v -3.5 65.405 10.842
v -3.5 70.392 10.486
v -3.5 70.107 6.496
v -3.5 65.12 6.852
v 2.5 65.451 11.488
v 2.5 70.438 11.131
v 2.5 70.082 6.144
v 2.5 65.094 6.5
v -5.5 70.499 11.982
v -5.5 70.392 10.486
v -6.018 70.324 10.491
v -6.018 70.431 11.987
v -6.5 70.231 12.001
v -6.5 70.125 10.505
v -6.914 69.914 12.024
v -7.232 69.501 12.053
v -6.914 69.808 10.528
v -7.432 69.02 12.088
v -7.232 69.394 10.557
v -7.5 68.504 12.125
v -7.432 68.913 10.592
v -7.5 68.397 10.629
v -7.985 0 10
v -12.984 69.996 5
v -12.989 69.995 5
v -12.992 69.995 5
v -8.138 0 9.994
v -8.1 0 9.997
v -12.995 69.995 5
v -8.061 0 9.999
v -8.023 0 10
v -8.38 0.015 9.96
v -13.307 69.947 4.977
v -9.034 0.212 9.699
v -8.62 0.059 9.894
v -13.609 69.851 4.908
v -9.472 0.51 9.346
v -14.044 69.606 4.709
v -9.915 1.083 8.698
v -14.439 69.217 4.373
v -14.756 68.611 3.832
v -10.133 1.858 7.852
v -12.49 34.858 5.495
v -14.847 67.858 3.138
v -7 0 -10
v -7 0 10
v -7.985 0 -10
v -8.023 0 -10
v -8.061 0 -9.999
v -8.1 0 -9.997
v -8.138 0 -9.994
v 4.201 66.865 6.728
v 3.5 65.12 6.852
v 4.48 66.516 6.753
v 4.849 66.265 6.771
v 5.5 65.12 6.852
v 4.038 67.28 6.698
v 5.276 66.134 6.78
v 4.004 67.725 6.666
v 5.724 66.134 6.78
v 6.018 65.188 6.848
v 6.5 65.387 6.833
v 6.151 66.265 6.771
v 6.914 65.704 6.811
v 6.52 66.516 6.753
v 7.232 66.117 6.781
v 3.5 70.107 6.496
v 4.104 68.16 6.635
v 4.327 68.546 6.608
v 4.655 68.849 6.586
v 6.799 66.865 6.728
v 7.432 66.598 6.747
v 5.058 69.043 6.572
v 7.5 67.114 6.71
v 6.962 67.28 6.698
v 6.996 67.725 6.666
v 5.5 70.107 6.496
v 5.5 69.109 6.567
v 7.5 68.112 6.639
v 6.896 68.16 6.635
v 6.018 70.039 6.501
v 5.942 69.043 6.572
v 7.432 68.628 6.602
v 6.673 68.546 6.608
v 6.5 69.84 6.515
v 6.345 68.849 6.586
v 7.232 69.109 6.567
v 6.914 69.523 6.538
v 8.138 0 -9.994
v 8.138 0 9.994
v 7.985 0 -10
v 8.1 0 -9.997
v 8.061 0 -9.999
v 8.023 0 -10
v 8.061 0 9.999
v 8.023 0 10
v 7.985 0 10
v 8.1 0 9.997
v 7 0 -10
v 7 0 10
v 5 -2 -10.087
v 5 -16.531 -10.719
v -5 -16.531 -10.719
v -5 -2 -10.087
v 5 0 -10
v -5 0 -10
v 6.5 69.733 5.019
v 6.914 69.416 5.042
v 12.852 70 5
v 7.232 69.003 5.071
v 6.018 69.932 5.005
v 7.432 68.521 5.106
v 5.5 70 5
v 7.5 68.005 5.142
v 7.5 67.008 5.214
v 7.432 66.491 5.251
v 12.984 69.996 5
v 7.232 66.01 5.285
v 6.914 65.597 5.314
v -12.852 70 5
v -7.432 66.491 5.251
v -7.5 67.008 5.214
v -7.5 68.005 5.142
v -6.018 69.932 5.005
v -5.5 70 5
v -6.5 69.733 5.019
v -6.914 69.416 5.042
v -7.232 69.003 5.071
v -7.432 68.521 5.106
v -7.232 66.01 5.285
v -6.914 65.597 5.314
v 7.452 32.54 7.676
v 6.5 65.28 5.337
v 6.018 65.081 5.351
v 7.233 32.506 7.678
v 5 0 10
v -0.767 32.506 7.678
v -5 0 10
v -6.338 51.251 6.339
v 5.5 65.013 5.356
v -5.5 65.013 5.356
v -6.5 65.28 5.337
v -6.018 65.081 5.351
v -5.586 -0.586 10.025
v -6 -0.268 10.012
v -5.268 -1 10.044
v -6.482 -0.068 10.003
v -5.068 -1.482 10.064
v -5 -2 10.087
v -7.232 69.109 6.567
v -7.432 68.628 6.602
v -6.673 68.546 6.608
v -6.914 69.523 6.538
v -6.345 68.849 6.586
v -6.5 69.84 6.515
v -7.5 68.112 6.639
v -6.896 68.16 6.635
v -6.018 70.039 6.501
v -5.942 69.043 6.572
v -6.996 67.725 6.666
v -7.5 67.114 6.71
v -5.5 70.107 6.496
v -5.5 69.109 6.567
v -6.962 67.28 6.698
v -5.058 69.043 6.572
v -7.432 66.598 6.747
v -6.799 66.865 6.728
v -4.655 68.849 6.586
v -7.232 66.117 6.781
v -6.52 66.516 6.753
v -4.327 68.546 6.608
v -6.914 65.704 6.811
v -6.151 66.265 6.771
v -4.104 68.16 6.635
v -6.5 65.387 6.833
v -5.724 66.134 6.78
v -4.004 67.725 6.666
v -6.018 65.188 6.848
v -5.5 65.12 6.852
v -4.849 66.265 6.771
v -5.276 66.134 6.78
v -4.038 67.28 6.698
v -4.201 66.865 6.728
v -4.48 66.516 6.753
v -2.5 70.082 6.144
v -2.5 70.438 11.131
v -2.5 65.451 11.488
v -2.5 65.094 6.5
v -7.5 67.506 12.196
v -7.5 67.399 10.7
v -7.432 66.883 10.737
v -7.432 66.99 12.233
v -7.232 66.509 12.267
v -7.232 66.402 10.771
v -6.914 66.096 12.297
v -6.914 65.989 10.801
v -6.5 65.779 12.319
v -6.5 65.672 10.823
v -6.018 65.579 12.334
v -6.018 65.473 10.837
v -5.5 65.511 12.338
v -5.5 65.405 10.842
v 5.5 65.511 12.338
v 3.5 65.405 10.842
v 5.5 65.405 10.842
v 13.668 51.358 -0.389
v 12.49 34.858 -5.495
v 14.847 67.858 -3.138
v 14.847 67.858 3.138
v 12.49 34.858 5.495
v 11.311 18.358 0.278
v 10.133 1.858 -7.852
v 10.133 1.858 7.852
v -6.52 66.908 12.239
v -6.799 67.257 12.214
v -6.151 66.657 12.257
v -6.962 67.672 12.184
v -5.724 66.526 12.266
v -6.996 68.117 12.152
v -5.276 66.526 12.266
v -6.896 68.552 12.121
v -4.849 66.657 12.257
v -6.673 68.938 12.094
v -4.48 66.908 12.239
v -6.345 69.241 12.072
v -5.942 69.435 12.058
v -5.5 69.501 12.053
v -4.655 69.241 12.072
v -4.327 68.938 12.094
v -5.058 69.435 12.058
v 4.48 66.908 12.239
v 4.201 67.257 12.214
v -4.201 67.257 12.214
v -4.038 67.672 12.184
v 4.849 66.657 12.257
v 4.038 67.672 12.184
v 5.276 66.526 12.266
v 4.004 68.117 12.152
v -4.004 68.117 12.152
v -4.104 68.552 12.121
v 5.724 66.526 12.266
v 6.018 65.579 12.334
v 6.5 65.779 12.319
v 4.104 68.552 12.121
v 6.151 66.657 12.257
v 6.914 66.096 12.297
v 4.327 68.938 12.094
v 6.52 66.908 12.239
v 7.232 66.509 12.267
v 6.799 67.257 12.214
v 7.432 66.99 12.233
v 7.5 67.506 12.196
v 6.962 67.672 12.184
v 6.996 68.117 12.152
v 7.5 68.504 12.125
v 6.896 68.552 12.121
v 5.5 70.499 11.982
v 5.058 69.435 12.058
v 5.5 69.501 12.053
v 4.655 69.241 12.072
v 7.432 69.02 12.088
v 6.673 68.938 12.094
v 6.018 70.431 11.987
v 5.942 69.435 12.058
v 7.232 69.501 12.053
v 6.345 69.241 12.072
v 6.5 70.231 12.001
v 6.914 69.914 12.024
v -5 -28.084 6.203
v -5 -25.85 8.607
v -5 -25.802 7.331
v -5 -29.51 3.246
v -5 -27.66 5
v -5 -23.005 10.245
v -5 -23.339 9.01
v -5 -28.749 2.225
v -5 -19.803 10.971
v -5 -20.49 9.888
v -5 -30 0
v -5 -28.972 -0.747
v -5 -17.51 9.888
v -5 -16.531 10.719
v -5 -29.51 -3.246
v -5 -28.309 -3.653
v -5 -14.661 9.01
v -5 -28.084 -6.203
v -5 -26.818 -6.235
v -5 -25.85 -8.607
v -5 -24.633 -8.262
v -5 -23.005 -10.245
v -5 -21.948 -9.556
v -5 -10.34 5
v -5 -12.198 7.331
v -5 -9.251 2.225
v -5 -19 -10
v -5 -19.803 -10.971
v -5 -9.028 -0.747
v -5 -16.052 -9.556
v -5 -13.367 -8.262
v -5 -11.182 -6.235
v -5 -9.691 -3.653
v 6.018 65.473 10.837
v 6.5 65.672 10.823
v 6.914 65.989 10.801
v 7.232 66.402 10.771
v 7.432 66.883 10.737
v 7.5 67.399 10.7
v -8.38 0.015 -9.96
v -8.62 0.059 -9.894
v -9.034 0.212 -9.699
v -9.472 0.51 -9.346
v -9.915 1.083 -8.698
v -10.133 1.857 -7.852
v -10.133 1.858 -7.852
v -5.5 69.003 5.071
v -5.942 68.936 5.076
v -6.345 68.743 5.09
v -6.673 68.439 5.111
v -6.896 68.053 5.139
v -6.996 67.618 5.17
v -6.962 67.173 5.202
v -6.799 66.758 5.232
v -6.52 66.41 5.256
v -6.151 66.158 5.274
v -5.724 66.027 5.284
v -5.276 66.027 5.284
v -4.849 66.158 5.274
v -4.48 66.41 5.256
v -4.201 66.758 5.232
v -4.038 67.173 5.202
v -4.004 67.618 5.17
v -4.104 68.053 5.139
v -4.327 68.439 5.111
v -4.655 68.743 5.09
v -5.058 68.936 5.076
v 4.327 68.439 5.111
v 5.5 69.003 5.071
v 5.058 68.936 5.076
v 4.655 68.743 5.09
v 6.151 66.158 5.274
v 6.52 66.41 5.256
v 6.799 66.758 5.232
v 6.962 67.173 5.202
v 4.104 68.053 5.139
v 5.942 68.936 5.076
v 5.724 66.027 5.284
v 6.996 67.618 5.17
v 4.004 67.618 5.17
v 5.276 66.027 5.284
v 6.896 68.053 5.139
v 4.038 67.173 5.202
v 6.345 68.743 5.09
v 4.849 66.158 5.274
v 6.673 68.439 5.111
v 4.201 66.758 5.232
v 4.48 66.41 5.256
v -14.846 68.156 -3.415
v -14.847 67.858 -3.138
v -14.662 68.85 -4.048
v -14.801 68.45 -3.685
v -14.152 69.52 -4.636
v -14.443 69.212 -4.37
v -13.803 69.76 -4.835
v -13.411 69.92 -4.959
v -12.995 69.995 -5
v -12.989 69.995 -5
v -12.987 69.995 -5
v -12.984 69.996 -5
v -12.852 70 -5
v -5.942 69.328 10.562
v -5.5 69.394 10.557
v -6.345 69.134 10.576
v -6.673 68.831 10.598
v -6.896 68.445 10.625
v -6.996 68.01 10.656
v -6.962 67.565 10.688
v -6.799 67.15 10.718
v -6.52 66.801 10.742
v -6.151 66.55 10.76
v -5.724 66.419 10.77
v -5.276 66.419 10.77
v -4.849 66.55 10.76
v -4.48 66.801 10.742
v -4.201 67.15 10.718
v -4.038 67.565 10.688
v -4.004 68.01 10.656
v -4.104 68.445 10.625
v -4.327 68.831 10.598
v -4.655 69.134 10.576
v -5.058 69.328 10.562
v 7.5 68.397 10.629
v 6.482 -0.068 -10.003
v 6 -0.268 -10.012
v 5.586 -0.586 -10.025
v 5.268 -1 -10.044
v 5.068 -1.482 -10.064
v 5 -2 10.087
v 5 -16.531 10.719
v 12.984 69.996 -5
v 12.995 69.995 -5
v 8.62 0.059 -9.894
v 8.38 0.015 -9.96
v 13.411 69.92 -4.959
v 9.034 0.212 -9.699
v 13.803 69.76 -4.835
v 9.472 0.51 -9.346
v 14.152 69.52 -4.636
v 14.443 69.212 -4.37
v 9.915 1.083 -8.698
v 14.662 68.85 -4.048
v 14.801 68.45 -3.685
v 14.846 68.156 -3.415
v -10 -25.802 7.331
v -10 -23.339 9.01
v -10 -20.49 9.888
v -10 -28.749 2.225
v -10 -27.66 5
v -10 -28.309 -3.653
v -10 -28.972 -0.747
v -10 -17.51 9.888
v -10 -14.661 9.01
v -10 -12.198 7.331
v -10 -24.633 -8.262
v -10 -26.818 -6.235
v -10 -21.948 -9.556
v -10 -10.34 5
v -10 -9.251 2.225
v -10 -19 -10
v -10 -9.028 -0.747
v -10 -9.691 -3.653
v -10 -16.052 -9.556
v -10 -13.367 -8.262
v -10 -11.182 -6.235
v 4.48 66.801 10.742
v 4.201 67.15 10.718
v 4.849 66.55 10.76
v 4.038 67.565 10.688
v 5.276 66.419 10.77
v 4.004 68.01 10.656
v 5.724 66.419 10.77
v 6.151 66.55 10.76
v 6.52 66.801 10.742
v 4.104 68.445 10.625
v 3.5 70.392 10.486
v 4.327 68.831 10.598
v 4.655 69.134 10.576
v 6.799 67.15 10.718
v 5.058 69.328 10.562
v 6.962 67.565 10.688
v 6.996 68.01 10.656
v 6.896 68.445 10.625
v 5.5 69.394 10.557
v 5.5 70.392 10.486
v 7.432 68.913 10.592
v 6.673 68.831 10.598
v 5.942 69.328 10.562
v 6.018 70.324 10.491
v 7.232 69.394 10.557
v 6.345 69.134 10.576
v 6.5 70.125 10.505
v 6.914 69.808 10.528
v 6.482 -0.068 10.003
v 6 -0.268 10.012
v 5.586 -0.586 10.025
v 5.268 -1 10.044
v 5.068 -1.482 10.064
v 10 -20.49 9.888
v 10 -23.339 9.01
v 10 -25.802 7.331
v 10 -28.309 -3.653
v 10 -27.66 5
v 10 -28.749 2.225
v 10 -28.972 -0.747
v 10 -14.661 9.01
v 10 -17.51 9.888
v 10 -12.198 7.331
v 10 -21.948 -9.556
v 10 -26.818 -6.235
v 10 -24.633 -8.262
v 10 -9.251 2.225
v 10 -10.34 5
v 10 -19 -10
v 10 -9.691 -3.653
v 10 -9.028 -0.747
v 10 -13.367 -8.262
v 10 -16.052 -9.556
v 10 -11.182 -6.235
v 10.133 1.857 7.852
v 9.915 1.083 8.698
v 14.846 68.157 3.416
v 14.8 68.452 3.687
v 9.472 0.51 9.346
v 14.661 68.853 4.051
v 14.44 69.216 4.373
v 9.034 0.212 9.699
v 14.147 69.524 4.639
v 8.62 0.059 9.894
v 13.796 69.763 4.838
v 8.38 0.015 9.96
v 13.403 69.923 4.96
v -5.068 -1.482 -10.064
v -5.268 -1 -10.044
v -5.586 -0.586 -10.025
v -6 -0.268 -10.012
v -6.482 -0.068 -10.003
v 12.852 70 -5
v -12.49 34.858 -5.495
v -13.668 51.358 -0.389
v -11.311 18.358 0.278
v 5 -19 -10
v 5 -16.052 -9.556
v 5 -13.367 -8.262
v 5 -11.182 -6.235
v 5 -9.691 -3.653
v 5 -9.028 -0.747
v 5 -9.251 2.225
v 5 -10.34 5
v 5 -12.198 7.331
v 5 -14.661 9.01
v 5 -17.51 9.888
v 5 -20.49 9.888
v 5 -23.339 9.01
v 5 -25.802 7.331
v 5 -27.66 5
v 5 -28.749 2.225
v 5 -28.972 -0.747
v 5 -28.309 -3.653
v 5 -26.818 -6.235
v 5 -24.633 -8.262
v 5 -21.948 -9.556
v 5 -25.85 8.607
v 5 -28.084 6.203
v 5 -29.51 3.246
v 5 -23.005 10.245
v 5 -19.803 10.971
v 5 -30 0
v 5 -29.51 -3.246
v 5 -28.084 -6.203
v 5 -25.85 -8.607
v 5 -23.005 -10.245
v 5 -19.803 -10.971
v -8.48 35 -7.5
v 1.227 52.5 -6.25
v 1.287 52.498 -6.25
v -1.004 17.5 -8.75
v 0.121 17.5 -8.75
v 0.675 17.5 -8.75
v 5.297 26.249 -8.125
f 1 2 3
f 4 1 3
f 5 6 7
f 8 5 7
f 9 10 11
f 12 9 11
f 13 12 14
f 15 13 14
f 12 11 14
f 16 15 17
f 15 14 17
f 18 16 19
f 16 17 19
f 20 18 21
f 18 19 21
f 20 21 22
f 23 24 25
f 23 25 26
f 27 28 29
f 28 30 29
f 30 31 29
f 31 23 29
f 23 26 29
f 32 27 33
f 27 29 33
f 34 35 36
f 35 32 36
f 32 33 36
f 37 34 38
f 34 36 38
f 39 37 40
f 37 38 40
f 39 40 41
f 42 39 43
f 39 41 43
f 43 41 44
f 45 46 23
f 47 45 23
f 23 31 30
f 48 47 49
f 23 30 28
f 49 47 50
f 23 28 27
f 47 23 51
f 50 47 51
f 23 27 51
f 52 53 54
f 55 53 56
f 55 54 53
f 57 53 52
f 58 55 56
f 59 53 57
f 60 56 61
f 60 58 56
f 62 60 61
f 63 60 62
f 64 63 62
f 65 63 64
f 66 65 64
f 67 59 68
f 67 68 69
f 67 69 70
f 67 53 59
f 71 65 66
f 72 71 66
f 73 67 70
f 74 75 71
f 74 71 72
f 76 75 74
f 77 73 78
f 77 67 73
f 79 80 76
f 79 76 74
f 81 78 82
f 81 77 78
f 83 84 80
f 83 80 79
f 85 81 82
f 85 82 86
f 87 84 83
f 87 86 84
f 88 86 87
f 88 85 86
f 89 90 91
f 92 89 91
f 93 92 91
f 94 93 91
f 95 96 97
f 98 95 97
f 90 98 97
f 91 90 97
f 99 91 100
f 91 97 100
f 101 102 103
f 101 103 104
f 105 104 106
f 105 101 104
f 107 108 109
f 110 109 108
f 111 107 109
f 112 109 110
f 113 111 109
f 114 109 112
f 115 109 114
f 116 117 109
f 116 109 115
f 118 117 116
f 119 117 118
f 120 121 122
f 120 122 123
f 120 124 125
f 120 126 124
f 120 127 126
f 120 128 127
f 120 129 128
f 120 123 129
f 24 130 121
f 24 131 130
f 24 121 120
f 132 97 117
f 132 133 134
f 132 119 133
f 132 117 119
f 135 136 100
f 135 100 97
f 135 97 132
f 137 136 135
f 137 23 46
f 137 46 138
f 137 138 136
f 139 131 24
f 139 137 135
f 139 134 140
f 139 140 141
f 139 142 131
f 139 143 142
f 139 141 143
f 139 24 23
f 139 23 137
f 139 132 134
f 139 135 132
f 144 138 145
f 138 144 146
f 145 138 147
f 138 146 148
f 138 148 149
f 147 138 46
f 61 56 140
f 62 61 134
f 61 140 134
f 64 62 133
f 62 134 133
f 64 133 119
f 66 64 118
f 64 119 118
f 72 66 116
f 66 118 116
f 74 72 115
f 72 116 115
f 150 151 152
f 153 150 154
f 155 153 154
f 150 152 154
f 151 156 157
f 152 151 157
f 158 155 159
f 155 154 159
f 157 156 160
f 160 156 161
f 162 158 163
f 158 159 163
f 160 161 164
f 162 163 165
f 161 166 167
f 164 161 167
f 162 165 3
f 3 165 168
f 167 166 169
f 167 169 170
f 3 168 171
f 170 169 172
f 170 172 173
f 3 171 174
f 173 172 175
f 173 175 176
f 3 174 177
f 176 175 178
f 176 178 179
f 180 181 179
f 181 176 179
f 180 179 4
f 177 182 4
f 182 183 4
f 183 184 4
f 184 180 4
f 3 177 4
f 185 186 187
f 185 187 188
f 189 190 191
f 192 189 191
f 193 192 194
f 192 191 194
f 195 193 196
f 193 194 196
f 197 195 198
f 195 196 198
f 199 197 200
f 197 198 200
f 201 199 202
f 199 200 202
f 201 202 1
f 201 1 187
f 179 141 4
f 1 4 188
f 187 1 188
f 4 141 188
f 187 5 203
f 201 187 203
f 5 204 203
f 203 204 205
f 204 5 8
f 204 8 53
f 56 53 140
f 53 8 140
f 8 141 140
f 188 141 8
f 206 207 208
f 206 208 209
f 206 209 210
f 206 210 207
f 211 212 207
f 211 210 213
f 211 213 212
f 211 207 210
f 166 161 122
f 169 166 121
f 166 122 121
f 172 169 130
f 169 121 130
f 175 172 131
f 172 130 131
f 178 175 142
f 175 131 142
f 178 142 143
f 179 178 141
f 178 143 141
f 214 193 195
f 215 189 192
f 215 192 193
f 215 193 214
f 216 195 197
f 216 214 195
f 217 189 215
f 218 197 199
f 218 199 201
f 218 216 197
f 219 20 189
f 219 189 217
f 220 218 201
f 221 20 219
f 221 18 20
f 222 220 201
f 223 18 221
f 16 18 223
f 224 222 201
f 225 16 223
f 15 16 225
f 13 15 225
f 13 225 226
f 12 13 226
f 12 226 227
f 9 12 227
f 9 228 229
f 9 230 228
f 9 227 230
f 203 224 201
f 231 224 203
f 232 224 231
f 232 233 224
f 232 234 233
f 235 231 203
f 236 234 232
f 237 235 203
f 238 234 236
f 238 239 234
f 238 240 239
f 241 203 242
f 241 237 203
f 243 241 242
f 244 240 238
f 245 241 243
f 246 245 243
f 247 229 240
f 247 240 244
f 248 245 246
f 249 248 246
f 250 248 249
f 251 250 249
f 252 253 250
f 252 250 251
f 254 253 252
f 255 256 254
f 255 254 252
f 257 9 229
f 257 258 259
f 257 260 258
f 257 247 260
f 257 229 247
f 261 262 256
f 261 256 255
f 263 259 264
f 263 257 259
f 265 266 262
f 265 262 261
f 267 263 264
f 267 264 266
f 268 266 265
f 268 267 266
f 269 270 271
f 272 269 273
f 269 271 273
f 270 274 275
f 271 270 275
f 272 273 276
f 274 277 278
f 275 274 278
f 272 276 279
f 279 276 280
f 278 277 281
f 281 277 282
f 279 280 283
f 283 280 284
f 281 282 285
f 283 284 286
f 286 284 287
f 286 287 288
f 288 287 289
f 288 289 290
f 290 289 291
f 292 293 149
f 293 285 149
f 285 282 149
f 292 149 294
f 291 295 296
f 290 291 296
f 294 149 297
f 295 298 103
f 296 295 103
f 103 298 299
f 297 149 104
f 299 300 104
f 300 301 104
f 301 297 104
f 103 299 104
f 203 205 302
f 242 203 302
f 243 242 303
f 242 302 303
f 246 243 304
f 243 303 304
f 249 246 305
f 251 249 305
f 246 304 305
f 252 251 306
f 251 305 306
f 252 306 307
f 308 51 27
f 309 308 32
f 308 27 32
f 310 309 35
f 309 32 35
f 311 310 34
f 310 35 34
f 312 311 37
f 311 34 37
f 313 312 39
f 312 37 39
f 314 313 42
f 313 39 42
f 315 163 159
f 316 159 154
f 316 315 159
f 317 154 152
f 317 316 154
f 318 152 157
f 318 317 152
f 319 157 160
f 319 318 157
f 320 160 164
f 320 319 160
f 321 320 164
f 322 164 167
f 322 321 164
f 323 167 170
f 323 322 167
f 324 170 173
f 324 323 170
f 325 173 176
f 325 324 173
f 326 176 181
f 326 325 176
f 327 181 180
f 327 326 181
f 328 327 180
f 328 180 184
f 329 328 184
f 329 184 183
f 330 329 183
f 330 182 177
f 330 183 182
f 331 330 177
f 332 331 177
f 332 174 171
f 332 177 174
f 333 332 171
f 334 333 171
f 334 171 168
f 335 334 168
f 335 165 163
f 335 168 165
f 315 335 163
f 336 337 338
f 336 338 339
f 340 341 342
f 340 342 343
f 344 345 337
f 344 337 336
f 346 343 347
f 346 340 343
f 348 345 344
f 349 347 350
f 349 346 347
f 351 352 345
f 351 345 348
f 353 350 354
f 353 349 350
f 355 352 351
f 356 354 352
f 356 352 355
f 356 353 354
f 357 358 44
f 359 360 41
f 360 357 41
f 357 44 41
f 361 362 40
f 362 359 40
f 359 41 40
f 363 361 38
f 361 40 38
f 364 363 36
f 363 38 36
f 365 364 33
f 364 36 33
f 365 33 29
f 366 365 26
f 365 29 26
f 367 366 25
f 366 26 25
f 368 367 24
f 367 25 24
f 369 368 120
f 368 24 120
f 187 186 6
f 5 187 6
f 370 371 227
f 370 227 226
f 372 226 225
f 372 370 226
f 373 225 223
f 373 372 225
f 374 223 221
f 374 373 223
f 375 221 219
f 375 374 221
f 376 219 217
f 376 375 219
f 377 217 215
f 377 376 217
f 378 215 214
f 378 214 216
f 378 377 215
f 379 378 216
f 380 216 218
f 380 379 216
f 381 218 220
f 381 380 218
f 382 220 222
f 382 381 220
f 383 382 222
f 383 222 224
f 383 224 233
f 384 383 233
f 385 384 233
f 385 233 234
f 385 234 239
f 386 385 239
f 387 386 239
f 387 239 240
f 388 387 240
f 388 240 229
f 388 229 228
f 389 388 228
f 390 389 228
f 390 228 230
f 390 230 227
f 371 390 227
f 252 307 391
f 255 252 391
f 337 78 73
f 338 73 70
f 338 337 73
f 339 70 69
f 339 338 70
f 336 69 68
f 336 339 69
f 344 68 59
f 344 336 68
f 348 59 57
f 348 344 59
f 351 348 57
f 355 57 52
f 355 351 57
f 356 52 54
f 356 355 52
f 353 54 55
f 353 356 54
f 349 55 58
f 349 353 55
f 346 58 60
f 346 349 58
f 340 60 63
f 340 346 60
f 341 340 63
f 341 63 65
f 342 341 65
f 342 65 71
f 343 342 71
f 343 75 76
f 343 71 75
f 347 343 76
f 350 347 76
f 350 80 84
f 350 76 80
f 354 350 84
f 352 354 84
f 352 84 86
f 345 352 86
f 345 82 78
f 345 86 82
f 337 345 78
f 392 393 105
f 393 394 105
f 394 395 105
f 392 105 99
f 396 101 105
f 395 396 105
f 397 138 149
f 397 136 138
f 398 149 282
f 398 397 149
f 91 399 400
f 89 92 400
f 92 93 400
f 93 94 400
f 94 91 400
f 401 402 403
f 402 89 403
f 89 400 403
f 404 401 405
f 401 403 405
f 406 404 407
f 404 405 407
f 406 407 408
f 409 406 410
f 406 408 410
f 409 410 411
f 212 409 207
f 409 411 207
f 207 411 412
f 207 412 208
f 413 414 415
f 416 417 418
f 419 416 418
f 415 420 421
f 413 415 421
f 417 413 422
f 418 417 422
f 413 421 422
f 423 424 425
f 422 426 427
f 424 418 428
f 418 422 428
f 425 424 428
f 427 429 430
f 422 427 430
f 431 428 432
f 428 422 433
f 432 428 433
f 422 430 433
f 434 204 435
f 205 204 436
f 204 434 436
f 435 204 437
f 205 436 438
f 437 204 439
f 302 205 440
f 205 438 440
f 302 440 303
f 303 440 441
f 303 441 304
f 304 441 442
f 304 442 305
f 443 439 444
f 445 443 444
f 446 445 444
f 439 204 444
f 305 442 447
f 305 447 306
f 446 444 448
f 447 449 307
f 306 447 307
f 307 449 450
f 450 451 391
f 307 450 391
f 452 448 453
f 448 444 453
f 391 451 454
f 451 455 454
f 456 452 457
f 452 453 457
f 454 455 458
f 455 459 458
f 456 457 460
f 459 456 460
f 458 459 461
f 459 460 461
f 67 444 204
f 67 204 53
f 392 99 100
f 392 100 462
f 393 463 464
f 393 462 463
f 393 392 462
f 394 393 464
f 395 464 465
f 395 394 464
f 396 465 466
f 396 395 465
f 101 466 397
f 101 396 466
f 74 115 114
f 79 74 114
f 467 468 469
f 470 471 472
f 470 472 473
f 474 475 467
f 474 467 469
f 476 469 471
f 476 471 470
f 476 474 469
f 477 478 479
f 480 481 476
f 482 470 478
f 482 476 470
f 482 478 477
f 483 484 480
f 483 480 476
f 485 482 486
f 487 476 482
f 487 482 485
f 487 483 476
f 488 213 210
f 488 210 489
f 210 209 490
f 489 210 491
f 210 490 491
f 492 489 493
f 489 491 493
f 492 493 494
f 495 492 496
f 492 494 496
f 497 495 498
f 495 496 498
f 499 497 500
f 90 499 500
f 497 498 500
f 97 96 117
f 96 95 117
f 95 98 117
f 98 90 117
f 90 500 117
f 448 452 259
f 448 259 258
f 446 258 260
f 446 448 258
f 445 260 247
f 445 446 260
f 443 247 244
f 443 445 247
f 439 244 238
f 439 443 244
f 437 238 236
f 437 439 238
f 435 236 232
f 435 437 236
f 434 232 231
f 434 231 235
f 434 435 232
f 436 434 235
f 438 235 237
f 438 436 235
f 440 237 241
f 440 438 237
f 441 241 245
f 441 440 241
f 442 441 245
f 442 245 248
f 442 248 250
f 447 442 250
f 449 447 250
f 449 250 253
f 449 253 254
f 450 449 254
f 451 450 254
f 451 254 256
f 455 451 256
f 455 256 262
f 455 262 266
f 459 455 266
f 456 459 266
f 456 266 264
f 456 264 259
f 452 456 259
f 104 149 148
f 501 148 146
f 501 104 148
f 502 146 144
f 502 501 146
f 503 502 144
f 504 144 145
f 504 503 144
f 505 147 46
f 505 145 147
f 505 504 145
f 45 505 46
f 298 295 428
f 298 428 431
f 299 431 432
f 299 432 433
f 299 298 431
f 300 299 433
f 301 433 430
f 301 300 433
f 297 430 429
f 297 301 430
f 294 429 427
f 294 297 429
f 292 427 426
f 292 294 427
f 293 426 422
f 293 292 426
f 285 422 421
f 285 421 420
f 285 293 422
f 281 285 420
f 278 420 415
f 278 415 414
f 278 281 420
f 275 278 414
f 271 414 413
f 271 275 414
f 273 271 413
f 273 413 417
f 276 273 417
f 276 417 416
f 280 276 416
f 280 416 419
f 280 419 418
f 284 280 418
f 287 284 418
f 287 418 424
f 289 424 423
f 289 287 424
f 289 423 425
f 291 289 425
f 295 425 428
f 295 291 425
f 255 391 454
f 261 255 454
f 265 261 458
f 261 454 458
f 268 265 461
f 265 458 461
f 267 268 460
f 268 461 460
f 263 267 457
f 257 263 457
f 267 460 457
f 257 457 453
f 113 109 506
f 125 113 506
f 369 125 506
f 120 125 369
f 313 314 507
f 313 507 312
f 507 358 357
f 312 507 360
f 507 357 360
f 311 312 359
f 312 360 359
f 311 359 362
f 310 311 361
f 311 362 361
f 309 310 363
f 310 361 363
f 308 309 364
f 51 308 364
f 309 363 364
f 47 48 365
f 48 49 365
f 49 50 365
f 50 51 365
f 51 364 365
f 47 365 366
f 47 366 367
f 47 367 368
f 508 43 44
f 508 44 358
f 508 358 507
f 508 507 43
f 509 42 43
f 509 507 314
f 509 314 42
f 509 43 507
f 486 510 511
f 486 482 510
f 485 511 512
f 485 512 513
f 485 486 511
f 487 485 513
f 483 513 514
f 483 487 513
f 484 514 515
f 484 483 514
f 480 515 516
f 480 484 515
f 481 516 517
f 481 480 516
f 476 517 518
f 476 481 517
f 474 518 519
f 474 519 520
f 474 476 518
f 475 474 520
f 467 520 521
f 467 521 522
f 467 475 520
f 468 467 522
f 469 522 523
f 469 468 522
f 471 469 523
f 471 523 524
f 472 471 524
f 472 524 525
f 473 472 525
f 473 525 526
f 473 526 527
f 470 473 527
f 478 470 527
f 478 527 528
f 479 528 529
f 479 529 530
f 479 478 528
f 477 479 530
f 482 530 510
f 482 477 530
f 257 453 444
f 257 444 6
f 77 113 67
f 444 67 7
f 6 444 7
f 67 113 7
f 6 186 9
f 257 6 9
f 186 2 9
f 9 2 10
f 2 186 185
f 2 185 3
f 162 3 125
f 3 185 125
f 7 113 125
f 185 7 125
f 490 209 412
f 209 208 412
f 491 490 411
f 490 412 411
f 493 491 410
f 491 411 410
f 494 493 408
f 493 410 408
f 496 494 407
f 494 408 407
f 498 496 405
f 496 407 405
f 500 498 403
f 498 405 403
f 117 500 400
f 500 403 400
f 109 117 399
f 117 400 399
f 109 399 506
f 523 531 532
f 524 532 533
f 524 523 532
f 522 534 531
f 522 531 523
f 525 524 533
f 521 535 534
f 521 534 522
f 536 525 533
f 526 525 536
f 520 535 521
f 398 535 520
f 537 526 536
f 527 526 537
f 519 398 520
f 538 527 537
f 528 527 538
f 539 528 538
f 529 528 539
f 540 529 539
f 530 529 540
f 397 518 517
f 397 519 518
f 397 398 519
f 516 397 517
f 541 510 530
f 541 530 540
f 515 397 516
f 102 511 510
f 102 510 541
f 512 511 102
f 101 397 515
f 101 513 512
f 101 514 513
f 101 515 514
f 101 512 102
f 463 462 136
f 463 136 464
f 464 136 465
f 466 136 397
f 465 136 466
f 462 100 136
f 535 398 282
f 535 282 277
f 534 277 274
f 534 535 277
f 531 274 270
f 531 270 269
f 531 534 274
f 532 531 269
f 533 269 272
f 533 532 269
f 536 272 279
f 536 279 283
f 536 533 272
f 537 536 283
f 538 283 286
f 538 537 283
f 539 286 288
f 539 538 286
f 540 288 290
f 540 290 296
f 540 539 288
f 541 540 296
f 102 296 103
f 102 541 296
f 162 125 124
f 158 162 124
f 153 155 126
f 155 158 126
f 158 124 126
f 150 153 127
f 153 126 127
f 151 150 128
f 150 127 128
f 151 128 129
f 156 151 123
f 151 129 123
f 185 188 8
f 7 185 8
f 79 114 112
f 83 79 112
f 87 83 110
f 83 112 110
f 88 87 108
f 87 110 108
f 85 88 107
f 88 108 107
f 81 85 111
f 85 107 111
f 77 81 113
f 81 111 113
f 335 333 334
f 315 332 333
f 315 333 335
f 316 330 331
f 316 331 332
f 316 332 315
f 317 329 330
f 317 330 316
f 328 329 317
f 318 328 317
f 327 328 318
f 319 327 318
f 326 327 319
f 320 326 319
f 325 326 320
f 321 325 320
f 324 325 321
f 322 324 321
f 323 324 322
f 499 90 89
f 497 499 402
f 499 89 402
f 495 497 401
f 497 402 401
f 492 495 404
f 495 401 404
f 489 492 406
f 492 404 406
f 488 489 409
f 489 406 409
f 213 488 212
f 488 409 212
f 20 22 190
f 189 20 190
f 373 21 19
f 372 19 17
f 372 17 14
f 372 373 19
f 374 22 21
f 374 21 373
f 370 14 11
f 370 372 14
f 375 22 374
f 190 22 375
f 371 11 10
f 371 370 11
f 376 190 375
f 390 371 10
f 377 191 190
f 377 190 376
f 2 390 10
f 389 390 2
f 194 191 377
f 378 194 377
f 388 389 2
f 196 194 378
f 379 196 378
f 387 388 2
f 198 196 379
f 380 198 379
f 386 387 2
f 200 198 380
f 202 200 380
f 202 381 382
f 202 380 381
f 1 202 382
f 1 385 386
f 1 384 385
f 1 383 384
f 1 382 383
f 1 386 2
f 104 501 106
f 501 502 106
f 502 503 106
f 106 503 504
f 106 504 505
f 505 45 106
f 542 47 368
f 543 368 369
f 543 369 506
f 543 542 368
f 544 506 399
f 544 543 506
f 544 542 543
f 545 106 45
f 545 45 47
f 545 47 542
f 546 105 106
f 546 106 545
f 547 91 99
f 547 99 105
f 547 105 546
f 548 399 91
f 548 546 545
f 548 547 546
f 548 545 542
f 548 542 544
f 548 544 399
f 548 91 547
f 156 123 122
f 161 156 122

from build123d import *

# Parameters (mm, degrees)
SALIENTE_EXTRUIR1_DEPTH = 5
CROQUIS5_R              = 10
SALIENTE_EXTRUIR2_DEPTH = 10
CROQUIS6_R              = 1.5
SALIENTE_EXTRUIR3_DEPTH = 7
CROQUIS7_W              = 4
CROQUIS7_H              = 4
CORTAR_EXTRUIR1_DEPTH   = 5
REDONDEO1_R             = 2
CROQUIS8_W              = 5
CROQUIS8_H              = 5
CORTAR_EXTRUIR2_DEPTH   = 10


with BuildPart() as part:
    # Croquis2 → Recubrir1 section 0
    with BuildSketch(Plane(origin=(0, 70, 0), x_dir=(1, 0, 0), z_dir=(0, 1, 0))):
        with BuildLine():
            Line((15, -5), (-15, -5))
            Line((-15, -5), (-15, 5))
            Line((-15, 5), (15, 5))
            Line((15, 5), (15, -5))
        make_face()
    # Croquis1 → Recubrir1 section 1
    with BuildSketch(Plane(origin=(0, 0, 0), x_dir=(1, 0, 0), z_dir=(0, 1, 0))):
        with BuildLine():
            Line((10, -10), (-10, -10))
            Line((-10, -10), (-10, 10))
            Line((-10, 10), (10, 10))
            Line((10, 10), (10, -10))
        make_face()
    loft()

    # Croquis4 → Saliente-Extruir1 (add, symmetric)
    with BuildSketch(Plane(origin=(0, 0, 0), x_dir=(0, 0, -1), z_dir=(1, 0, 0))):
        with BuildLine():
            Line((-10, 0), (-10.71921501, -16.530500138))
            ThreePointArc((-10.71921501, -16.530500138), (0, -30), (10.71921501, -16.530500138))
            Line((10.71921501, -16.530500138), (10, 0))
            Line((10, 0), (-10, 0))
        make_face()
    extrude(amount=SALIENTE_EXTRUIR1_DEPTH, both=True)

    # Croquis5 → Saliente-Extruir2 (add, symmetric)
    with BuildSketch(Plane(origin=(0, 0, 0), x_dir=(0, 0, -1), z_dir=(1, 0, 0))):
        with Locations((0, -19)):
            Circle(CROQUIS5_R)
    extrude(amount=SALIENTE_EXTRUIR2_DEPTH, both=True)

    # Croquis6 → Saliente-Extruir3 (add)
    with BuildSketch(Plane(origin=(0, 0.710659898, 9.949238579), x_dir=(1, 0, 0), z_dir=(0, 0.07124704998790965, 0.997458699830735))):
        with BuildLine():
            Line((-5.5, 64.465873738), (5.5, 64.465873738))
            ThreePointArc((5.5, 64.465873738), (6.914213562, 65.051660176), (7.5, 66.465873738))
            Line((7.5, 66.465873738), (7.5, 67.465873738))
            ThreePointArc((7.5, 67.465873738), (6.914213562, 68.880087301), (5.5, 69.465873738))
            Line((5.5, 69.465873738), (-5.5, 69.465873738))
            ThreePointArc((-5.5, 69.465873738), (-6.914213562, 68.880087301), (-7.5, 67.465873738))
            Line((-7.5, 67.465873738), (-7.5, 66.465873738))
            ThreePointArc((-7.5, 66.465873738), (-6.914213562, 65.051660176), (-5.5, 64.465873738))
        make_face()
        with Locations(Location((-5.5, 66.965873738, 0), (0, 0, 90))):
            Circle(CROQUIS6_R, mode=Mode.SUBTRACT)
        with Locations(Location((5.5, 66.965873738, 0), (0, 0, 90))):
            Circle(CROQUIS6_R, mode=Mode.SUBTRACT)
    extrude(amount=SALIENTE_EXTRUIR3_DEPTH)

    # Croquis7 → Cortar-Extruir1 (cut, symmetric)
    with BuildSketch(Plane(origin=(0, 69.289340102, -4.949238579), x_dir=(1, 0, 0), z_dir=(0, 0.997458699830735, -0.07124704998790966))):
        with Locations((-5.5, -13.474586998)):
            Rectangle(CROQUIS7_W, CROQUIS7_H)
        with Locations((5.5, -13.474586998)):
            Rectangle(CROQUIS7_W, CROQUIS7_H)
    extrude(amount=CORTAR_EXTRUIR1_DEPTH, both=True, mode=Mode.SUBTRACT)

    # Redondeo1
    # the kernel refuses this fillet: 2 mm, written as the material it adds along each edge
    with BuildSketch(Plane(origin=(-5, 0, -15), x_dir=(-1, 0, 0), z_dir=(0, 0, 1))) as redondeo1_piece_1_section:
        with BuildLine():
            CenterArc((REDONDEO1_R, REDONDEO1_R), REDONDEO1_R, 180, 90)
            Line((0, REDONDEO1_R), (0, 0))
            Line((0, 0), (REDONDEO1_R, 0))
        make_face()
    redondeo1_piece_1 = extrude(amount=30, mode=Mode.PRIVATE)
    redondeo1_piece_1 = split(redondeo1_piece_1, bisect_by=Plane(origin=(-5.45231098, -0.018481015, 10.000804079), z_dir=(0, -0.043467241760335076, -0.999054852795255)), keep=Keep.TOP, mode=Mode.PRIVATE)
    redondeo1_piece_1 = split(redondeo1_piece_1, bisect_by=Plane(origin=(-5.45231098, -0.018481001, -10.000804078), z_dir=(0, -0.04346724176032877, 0.9990548527952553)), keep=Keep.TOP, mode=Mode.PRIVATE)
    add(redondeo1_piece_1)
    with BuildSketch(Plane(origin=(5, 0, -15), x_dir=(1, 0, 0), z_dir=(0, 0, 1))) as redondeo1_piece_2_section:
        with BuildLine():
            CenterArc((REDONDEO1_R, -REDONDEO1_R), REDONDEO1_R, 90, 90)
            Line((0, -REDONDEO1_R), (0, 0))
            Line((0, 0), (REDONDEO1_R, 0))
        make_face()
    redondeo1_piece_2 = extrude(amount=30, mode=Mode.PRIVATE)
    redondeo1_piece_2 = split(redondeo1_piece_2, bisect_by=Plane(origin=(5.45231098, -0.018481001, 10.000804078), z_dir=(0, -0.043467241760335076, -0.999054852795255)), keep=Keep.TOP, mode=Mode.PRIVATE)
    redondeo1_piece_2 = split(redondeo1_piece_2, bisect_by=Plane(origin=(5.45231098, -0.018481015, -10.000804079), z_dir=(0, -0.04346724176032877, 0.9990548527952553)), keep=Keep.TOP, mode=Mode.PRIVATE)
    add(redondeo1_piece_2)
    # the kernel refuses this fillet: 2 mm, written as the material it takes off along each edge
    with BuildSketch(Plane(origin=(15, 70, -10.369881731), x_dir=(-1, 0, 0), z_dir=(0, 0, 1))) as redondeo1_2_piece_1:
        with BuildLine():
            CenterArc((REDONDEO1_R * 1.07397634626, REDONDEO1_R), REDONDEO1_R, 175.91438322, 94.08561678)
            Line((REDONDEO1_R * 0.0765176464277, REDONDEO1_R * 1.07124704999), (0, 0))
            Line((0, 0), (REDONDEO1_R * 1.07397634626, 0))
        make_face()
    extrude(amount=20.739763463, mode=Mode.SUBTRACT)
    with BuildSketch(Plane(origin=(15.357142857, 75, -4.642857143), x_dir=(-0.9974715509474419, 0.07088630311301622, 0.00506330736521557), z_dir=(-0.07106690545187021, -0.9949366763261821, -0.07106690545187017)), Plane(origin=(-15.357142857, 75, 4.642857143), x_dir=(0.9974715509474419, 0.07088630311301611, -0.005063307365215563), z_dir=(0.0710669054518701, -0.9949366763261821, 0.07106690545187014))) as redondeo1_2_piece_2:
        with BuildLine():
            CenterArc((REDONDEO1_R * 1.00508909139, -REDONDEO1_R), REDONDEO1_R, 90, 90.290842769)
            Line((REDONDEO1_R * 0.0051019750832, -REDONDEO1_R * 1.00507614213), (0, 0))
            Line((0, 0), (REDONDEO1_R * 1.00508909139, 0))
        make_face()
    extrude(amount=80.407127311, mode=Mode.SUBTRACT)
    with BuildSketch(Plane(origin=(10, 0, -14.655596017), x_dir=(-1, 0, 0), z_dir=(0, 0, 1)), Plane(origin=(-10, 0, 14.655596017), x_dir=(1, 0, 0), z_dir=(0, 0, -1))) as redondeo1_2_piece_3:
        with BuildLine():
            CenterArc((REDONDEO1_R * 0.931119203401, -REDONDEO1_R), REDONDEO1_R, 90, 85.91438322)
            Line((-REDONDEO1_R * 0.0663394964294, -REDONDEO1_R * 0.928752950012), (0, 0))
            Line((0, 0), (REDONDEO1_R * 0.931119203401, 0))
        make_face()
    extrude(amount=29.311192034, mode=Mode.SUBTRACT)
    with BuildSketch(Plane(origin=(15.357142857, 75, 4.642857143), x_dir=(-0.9974715509474419, 0.07088630311301623, -0.005063307365215571), z_dir=(-0.07106690545187021, -0.9949366763261821, 0.07106690545187014)), Plane(origin=(-15.357142857, 75, -4.642857143), x_dir=(0.9974715509474419, 0.07088630311301615, 0.005063307365215123), z_dir=(0.0710669054518701, -0.9949366763261821, -0.07106690545187017))) as redondeo1_2_piece_4:
        with BuildLine():
            CenterArc((REDONDEO1_R * 1.00508909139, REDONDEO1_R), REDONDEO1_R, 179.709157231, 90.290842769)
            Line((REDONDEO1_R * 0.0051019750832, REDONDEO1_R * 1.00507614213), (0, 0))
            Line((0, 0), (REDONDEO1_R * 1.00508909139, 0))
        make_face()
    extrude(amount=80.407127311, mode=Mode.SUBTRACT)
    with BuildSketch(Plane(origin=(-15, 70, 10.369881731), x_dir=(0.07124704998790952, -0.997458699830735, 0), z_dir=(0, 0, -1))) as redondeo1_2_piece_5:
        with BuildLine():
            CenterArc((REDONDEO1_R * 1.07397634626, -REDONDEO1_R), REDONDEO1_R, 90, 94.08561678)
            Line((REDONDEO1_R * 0.0765176464277, -REDONDEO1_R * 1.07124704999), (0, 0))
            Line((0, 0), (REDONDEO1_R * 1.07397634626, 0))
        make_face()
    extrude(amount=20.739763463, mode=Mode.SUBTRACT)

    # Croquis8 → Cortar-Extruir2 (cut)
    with BuildSketch(Plane(origin=(0, 69.289340102, -4.949238579), x_dir=(1, 0, 0), z_dir=(0, 0.997458699830735, -0.07124704998790966))):
        with Locations((0, -13.621474852)):
            Rectangle(CROQUIS8_W, CROQUIS8_H)
    extrude(amount=-CORTAR_EXTRUIR2_DEPTH, mode=Mode.SUBTRACT)


solid = part.part
